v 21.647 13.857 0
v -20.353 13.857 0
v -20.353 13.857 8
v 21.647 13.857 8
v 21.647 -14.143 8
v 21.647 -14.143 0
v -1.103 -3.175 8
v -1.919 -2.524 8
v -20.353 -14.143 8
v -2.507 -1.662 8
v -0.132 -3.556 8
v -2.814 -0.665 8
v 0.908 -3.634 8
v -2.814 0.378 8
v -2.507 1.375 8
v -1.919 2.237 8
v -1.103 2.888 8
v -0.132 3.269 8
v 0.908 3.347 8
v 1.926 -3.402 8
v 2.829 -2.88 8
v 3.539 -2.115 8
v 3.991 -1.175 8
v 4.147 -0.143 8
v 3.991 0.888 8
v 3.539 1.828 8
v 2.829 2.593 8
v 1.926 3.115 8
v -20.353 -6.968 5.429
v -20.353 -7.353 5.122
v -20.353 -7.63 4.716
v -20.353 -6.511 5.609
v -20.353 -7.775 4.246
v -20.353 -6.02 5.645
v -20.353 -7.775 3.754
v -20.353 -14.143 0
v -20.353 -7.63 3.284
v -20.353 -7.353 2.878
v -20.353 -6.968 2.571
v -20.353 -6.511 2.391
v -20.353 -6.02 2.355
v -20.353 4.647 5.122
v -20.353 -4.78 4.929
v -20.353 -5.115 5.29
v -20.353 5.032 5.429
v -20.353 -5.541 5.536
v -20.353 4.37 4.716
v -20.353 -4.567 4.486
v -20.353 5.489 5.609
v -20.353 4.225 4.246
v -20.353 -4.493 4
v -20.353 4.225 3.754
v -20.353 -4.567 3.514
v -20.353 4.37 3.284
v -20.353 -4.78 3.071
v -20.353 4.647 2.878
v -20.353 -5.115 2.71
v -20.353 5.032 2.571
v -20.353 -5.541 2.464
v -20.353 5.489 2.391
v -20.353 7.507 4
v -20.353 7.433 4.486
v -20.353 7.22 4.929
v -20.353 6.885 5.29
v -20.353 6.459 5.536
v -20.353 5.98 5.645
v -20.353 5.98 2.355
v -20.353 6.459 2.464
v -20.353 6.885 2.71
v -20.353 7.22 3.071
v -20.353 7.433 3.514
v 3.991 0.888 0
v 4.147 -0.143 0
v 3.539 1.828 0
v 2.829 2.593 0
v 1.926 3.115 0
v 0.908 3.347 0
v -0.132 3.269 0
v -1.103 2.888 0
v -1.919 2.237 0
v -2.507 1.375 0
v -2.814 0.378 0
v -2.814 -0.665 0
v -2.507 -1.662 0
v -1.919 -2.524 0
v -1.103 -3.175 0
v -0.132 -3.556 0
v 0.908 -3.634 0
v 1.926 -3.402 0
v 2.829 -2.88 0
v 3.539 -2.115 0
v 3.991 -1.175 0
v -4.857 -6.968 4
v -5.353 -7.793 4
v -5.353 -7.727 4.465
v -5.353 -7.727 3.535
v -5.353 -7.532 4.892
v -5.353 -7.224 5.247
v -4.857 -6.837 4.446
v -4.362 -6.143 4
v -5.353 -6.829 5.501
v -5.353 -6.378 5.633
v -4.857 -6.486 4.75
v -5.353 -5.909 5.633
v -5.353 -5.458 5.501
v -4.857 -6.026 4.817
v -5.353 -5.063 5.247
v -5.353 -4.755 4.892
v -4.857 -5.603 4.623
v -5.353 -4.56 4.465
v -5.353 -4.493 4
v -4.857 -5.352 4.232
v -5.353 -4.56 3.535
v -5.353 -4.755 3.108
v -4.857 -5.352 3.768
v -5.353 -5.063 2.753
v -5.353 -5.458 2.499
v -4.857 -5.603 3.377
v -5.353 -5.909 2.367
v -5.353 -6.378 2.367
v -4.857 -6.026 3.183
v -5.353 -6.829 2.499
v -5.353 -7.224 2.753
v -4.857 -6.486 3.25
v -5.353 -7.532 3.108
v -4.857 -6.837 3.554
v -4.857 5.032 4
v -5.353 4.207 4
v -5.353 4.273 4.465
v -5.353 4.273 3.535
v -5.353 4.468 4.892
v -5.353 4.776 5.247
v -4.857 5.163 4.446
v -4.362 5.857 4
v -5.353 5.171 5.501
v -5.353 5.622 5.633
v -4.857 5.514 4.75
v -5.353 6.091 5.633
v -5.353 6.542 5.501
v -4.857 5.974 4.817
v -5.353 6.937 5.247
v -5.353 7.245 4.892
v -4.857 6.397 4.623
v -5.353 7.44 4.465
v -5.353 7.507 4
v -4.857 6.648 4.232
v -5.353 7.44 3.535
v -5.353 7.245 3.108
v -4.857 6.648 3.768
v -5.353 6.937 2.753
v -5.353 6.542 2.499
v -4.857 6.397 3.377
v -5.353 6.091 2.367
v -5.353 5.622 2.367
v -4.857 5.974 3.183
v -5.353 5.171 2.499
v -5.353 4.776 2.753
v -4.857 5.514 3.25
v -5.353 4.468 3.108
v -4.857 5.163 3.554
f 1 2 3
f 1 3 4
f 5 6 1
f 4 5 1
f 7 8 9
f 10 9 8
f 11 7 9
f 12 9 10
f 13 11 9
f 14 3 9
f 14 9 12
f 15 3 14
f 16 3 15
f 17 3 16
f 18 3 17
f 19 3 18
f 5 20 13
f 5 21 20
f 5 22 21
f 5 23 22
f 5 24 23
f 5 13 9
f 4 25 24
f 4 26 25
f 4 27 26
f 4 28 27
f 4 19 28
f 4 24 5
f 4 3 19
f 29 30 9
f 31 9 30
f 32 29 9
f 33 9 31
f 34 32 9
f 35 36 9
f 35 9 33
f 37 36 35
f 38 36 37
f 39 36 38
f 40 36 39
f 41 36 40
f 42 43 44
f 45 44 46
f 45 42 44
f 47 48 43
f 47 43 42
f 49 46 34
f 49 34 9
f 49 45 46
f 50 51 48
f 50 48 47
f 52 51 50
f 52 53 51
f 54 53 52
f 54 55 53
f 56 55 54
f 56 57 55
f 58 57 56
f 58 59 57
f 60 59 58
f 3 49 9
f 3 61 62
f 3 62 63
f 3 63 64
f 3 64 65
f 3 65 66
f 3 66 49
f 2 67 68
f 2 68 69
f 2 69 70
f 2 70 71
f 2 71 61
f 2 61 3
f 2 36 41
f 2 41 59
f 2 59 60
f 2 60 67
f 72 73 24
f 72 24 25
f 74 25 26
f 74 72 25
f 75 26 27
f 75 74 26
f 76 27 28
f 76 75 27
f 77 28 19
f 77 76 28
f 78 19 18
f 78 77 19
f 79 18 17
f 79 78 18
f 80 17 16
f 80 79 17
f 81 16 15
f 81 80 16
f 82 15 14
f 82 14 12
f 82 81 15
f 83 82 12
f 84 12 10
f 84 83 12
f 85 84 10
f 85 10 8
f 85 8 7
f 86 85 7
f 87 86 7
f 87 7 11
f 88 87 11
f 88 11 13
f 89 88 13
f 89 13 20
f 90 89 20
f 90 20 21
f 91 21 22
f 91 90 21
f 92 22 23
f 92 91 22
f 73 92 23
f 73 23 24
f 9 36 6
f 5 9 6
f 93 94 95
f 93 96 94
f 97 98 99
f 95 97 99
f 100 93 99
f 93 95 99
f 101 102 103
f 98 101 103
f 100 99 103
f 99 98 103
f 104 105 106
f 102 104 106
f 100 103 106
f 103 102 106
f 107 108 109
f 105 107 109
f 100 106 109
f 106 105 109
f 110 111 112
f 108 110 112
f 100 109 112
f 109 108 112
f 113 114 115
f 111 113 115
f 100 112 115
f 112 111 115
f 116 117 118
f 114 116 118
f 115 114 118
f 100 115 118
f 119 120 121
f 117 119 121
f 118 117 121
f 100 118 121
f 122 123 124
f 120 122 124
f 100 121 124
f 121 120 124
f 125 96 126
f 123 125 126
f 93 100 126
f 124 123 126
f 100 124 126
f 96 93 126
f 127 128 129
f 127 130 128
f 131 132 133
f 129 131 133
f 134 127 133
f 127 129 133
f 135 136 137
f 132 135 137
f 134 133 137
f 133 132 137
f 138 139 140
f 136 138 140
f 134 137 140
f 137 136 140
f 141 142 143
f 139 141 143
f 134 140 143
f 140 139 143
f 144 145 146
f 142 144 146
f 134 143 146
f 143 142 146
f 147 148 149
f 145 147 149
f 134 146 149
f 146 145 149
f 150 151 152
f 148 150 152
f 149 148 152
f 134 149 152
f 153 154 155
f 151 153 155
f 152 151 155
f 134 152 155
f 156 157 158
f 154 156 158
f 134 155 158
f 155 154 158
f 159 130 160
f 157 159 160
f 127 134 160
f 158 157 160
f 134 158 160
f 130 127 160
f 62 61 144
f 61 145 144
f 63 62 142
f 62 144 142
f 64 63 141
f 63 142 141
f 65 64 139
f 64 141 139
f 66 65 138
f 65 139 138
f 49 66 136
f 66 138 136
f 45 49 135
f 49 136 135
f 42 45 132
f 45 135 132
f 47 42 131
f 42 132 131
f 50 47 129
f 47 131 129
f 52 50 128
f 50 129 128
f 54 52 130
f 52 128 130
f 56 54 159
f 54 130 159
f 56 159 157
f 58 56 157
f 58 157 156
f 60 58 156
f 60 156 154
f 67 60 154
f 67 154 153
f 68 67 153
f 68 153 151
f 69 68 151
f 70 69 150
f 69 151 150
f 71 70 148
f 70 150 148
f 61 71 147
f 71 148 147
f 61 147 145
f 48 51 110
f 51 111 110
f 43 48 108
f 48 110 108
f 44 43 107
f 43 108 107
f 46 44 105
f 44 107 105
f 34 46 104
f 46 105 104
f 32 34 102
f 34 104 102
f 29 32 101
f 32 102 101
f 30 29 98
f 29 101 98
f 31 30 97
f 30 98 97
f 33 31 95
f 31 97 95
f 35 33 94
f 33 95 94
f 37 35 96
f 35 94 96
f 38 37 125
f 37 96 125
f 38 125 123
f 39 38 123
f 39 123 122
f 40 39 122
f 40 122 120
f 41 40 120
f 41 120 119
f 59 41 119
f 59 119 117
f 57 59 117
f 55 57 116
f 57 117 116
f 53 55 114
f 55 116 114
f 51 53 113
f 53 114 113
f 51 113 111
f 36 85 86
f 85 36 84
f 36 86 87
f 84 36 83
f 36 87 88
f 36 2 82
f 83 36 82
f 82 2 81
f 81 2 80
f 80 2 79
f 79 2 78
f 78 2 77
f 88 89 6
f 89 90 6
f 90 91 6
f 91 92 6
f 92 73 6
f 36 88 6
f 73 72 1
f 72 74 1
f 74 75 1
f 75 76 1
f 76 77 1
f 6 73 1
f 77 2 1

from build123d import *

# Parameters (mm, degrees)
SKIZZE1_W                       = 42
SKIZZE1_H                       = 28
SKIZZE1_R                       = 3.5
AUFSATZ_LINEAR_AUSTRAGEN1_DEPTH = 8
SKIZZE2_R                       = 1.6
SCHNITT_LINEAR_AUSTRAGEN1_DEPTH = 15
M4_GEWINDEBOHRUNG1_D            = 3.3
M4_GEWINDEBOHRUNG1_DEPTH        = 15
M4_GEWINDEBOHRUNG1_TIP          = 0.991420021


with BuildPart() as part:
    # Skizze1 → Aufsatz-Linear austragen1 (new body)
    with BuildSketch(Plane.XY):
        with Locations((0.646863863, -0.143442623)):
            Rectangle(SKIZZE1_W, SKIZZE1_H)
        with Locations((0.646863863, -0.143442623)):
            Circle(SKIZZE1_R, mode=Mode.SUBTRACT)
    extrude(amount=AUFSATZ_LINEAR_AUSTRAGEN1_DEPTH)

    # Skizze2 → Schnitt-Linear austragen1 (cut)
    with BuildSketch(Plane.ZY.offset(20.353136137)):
        with Locations(Location((4, 5.856557377, 0), (0, 0, 270))):
            Circle(SKIZZE2_R)
        with Locations(Location((4, -6.143442623, 0), (0, 0, 270))):
            Circle(SKIZZE2_R)
    extrude(amount=-SCHNITT_LINEAR_AUSTRAGEN1_DEPTH, mode=Mode.SUBTRACT)

    # M4 Gewindebohrung1
    with Locations(Plane(origin=(-20.353136137, -6.143442623, 4), x_dir=(0, -1, 0), z_dir=(-1, 0, 0))):
        with Locations((0, 0), (-12, 0)):
            Hole(M4_GEWINDEBOHRUNG1_D / 2, depth=M4_GEWINDEBOHRUNG1_DEPTH)
            with Locations((0, 0, -(M4_GEWINDEBOHRUNG1_DEPTH + M4_GEWINDEBOHRUNG1_TIP / 2))):  # 118° drill point
                Cone(0, M4_GEWINDEBOHRUNG1_D / 2, M4_GEWINDEBOHRUNG1_TIP, mode=Mode.SUBTRACT)


solid = part.part
